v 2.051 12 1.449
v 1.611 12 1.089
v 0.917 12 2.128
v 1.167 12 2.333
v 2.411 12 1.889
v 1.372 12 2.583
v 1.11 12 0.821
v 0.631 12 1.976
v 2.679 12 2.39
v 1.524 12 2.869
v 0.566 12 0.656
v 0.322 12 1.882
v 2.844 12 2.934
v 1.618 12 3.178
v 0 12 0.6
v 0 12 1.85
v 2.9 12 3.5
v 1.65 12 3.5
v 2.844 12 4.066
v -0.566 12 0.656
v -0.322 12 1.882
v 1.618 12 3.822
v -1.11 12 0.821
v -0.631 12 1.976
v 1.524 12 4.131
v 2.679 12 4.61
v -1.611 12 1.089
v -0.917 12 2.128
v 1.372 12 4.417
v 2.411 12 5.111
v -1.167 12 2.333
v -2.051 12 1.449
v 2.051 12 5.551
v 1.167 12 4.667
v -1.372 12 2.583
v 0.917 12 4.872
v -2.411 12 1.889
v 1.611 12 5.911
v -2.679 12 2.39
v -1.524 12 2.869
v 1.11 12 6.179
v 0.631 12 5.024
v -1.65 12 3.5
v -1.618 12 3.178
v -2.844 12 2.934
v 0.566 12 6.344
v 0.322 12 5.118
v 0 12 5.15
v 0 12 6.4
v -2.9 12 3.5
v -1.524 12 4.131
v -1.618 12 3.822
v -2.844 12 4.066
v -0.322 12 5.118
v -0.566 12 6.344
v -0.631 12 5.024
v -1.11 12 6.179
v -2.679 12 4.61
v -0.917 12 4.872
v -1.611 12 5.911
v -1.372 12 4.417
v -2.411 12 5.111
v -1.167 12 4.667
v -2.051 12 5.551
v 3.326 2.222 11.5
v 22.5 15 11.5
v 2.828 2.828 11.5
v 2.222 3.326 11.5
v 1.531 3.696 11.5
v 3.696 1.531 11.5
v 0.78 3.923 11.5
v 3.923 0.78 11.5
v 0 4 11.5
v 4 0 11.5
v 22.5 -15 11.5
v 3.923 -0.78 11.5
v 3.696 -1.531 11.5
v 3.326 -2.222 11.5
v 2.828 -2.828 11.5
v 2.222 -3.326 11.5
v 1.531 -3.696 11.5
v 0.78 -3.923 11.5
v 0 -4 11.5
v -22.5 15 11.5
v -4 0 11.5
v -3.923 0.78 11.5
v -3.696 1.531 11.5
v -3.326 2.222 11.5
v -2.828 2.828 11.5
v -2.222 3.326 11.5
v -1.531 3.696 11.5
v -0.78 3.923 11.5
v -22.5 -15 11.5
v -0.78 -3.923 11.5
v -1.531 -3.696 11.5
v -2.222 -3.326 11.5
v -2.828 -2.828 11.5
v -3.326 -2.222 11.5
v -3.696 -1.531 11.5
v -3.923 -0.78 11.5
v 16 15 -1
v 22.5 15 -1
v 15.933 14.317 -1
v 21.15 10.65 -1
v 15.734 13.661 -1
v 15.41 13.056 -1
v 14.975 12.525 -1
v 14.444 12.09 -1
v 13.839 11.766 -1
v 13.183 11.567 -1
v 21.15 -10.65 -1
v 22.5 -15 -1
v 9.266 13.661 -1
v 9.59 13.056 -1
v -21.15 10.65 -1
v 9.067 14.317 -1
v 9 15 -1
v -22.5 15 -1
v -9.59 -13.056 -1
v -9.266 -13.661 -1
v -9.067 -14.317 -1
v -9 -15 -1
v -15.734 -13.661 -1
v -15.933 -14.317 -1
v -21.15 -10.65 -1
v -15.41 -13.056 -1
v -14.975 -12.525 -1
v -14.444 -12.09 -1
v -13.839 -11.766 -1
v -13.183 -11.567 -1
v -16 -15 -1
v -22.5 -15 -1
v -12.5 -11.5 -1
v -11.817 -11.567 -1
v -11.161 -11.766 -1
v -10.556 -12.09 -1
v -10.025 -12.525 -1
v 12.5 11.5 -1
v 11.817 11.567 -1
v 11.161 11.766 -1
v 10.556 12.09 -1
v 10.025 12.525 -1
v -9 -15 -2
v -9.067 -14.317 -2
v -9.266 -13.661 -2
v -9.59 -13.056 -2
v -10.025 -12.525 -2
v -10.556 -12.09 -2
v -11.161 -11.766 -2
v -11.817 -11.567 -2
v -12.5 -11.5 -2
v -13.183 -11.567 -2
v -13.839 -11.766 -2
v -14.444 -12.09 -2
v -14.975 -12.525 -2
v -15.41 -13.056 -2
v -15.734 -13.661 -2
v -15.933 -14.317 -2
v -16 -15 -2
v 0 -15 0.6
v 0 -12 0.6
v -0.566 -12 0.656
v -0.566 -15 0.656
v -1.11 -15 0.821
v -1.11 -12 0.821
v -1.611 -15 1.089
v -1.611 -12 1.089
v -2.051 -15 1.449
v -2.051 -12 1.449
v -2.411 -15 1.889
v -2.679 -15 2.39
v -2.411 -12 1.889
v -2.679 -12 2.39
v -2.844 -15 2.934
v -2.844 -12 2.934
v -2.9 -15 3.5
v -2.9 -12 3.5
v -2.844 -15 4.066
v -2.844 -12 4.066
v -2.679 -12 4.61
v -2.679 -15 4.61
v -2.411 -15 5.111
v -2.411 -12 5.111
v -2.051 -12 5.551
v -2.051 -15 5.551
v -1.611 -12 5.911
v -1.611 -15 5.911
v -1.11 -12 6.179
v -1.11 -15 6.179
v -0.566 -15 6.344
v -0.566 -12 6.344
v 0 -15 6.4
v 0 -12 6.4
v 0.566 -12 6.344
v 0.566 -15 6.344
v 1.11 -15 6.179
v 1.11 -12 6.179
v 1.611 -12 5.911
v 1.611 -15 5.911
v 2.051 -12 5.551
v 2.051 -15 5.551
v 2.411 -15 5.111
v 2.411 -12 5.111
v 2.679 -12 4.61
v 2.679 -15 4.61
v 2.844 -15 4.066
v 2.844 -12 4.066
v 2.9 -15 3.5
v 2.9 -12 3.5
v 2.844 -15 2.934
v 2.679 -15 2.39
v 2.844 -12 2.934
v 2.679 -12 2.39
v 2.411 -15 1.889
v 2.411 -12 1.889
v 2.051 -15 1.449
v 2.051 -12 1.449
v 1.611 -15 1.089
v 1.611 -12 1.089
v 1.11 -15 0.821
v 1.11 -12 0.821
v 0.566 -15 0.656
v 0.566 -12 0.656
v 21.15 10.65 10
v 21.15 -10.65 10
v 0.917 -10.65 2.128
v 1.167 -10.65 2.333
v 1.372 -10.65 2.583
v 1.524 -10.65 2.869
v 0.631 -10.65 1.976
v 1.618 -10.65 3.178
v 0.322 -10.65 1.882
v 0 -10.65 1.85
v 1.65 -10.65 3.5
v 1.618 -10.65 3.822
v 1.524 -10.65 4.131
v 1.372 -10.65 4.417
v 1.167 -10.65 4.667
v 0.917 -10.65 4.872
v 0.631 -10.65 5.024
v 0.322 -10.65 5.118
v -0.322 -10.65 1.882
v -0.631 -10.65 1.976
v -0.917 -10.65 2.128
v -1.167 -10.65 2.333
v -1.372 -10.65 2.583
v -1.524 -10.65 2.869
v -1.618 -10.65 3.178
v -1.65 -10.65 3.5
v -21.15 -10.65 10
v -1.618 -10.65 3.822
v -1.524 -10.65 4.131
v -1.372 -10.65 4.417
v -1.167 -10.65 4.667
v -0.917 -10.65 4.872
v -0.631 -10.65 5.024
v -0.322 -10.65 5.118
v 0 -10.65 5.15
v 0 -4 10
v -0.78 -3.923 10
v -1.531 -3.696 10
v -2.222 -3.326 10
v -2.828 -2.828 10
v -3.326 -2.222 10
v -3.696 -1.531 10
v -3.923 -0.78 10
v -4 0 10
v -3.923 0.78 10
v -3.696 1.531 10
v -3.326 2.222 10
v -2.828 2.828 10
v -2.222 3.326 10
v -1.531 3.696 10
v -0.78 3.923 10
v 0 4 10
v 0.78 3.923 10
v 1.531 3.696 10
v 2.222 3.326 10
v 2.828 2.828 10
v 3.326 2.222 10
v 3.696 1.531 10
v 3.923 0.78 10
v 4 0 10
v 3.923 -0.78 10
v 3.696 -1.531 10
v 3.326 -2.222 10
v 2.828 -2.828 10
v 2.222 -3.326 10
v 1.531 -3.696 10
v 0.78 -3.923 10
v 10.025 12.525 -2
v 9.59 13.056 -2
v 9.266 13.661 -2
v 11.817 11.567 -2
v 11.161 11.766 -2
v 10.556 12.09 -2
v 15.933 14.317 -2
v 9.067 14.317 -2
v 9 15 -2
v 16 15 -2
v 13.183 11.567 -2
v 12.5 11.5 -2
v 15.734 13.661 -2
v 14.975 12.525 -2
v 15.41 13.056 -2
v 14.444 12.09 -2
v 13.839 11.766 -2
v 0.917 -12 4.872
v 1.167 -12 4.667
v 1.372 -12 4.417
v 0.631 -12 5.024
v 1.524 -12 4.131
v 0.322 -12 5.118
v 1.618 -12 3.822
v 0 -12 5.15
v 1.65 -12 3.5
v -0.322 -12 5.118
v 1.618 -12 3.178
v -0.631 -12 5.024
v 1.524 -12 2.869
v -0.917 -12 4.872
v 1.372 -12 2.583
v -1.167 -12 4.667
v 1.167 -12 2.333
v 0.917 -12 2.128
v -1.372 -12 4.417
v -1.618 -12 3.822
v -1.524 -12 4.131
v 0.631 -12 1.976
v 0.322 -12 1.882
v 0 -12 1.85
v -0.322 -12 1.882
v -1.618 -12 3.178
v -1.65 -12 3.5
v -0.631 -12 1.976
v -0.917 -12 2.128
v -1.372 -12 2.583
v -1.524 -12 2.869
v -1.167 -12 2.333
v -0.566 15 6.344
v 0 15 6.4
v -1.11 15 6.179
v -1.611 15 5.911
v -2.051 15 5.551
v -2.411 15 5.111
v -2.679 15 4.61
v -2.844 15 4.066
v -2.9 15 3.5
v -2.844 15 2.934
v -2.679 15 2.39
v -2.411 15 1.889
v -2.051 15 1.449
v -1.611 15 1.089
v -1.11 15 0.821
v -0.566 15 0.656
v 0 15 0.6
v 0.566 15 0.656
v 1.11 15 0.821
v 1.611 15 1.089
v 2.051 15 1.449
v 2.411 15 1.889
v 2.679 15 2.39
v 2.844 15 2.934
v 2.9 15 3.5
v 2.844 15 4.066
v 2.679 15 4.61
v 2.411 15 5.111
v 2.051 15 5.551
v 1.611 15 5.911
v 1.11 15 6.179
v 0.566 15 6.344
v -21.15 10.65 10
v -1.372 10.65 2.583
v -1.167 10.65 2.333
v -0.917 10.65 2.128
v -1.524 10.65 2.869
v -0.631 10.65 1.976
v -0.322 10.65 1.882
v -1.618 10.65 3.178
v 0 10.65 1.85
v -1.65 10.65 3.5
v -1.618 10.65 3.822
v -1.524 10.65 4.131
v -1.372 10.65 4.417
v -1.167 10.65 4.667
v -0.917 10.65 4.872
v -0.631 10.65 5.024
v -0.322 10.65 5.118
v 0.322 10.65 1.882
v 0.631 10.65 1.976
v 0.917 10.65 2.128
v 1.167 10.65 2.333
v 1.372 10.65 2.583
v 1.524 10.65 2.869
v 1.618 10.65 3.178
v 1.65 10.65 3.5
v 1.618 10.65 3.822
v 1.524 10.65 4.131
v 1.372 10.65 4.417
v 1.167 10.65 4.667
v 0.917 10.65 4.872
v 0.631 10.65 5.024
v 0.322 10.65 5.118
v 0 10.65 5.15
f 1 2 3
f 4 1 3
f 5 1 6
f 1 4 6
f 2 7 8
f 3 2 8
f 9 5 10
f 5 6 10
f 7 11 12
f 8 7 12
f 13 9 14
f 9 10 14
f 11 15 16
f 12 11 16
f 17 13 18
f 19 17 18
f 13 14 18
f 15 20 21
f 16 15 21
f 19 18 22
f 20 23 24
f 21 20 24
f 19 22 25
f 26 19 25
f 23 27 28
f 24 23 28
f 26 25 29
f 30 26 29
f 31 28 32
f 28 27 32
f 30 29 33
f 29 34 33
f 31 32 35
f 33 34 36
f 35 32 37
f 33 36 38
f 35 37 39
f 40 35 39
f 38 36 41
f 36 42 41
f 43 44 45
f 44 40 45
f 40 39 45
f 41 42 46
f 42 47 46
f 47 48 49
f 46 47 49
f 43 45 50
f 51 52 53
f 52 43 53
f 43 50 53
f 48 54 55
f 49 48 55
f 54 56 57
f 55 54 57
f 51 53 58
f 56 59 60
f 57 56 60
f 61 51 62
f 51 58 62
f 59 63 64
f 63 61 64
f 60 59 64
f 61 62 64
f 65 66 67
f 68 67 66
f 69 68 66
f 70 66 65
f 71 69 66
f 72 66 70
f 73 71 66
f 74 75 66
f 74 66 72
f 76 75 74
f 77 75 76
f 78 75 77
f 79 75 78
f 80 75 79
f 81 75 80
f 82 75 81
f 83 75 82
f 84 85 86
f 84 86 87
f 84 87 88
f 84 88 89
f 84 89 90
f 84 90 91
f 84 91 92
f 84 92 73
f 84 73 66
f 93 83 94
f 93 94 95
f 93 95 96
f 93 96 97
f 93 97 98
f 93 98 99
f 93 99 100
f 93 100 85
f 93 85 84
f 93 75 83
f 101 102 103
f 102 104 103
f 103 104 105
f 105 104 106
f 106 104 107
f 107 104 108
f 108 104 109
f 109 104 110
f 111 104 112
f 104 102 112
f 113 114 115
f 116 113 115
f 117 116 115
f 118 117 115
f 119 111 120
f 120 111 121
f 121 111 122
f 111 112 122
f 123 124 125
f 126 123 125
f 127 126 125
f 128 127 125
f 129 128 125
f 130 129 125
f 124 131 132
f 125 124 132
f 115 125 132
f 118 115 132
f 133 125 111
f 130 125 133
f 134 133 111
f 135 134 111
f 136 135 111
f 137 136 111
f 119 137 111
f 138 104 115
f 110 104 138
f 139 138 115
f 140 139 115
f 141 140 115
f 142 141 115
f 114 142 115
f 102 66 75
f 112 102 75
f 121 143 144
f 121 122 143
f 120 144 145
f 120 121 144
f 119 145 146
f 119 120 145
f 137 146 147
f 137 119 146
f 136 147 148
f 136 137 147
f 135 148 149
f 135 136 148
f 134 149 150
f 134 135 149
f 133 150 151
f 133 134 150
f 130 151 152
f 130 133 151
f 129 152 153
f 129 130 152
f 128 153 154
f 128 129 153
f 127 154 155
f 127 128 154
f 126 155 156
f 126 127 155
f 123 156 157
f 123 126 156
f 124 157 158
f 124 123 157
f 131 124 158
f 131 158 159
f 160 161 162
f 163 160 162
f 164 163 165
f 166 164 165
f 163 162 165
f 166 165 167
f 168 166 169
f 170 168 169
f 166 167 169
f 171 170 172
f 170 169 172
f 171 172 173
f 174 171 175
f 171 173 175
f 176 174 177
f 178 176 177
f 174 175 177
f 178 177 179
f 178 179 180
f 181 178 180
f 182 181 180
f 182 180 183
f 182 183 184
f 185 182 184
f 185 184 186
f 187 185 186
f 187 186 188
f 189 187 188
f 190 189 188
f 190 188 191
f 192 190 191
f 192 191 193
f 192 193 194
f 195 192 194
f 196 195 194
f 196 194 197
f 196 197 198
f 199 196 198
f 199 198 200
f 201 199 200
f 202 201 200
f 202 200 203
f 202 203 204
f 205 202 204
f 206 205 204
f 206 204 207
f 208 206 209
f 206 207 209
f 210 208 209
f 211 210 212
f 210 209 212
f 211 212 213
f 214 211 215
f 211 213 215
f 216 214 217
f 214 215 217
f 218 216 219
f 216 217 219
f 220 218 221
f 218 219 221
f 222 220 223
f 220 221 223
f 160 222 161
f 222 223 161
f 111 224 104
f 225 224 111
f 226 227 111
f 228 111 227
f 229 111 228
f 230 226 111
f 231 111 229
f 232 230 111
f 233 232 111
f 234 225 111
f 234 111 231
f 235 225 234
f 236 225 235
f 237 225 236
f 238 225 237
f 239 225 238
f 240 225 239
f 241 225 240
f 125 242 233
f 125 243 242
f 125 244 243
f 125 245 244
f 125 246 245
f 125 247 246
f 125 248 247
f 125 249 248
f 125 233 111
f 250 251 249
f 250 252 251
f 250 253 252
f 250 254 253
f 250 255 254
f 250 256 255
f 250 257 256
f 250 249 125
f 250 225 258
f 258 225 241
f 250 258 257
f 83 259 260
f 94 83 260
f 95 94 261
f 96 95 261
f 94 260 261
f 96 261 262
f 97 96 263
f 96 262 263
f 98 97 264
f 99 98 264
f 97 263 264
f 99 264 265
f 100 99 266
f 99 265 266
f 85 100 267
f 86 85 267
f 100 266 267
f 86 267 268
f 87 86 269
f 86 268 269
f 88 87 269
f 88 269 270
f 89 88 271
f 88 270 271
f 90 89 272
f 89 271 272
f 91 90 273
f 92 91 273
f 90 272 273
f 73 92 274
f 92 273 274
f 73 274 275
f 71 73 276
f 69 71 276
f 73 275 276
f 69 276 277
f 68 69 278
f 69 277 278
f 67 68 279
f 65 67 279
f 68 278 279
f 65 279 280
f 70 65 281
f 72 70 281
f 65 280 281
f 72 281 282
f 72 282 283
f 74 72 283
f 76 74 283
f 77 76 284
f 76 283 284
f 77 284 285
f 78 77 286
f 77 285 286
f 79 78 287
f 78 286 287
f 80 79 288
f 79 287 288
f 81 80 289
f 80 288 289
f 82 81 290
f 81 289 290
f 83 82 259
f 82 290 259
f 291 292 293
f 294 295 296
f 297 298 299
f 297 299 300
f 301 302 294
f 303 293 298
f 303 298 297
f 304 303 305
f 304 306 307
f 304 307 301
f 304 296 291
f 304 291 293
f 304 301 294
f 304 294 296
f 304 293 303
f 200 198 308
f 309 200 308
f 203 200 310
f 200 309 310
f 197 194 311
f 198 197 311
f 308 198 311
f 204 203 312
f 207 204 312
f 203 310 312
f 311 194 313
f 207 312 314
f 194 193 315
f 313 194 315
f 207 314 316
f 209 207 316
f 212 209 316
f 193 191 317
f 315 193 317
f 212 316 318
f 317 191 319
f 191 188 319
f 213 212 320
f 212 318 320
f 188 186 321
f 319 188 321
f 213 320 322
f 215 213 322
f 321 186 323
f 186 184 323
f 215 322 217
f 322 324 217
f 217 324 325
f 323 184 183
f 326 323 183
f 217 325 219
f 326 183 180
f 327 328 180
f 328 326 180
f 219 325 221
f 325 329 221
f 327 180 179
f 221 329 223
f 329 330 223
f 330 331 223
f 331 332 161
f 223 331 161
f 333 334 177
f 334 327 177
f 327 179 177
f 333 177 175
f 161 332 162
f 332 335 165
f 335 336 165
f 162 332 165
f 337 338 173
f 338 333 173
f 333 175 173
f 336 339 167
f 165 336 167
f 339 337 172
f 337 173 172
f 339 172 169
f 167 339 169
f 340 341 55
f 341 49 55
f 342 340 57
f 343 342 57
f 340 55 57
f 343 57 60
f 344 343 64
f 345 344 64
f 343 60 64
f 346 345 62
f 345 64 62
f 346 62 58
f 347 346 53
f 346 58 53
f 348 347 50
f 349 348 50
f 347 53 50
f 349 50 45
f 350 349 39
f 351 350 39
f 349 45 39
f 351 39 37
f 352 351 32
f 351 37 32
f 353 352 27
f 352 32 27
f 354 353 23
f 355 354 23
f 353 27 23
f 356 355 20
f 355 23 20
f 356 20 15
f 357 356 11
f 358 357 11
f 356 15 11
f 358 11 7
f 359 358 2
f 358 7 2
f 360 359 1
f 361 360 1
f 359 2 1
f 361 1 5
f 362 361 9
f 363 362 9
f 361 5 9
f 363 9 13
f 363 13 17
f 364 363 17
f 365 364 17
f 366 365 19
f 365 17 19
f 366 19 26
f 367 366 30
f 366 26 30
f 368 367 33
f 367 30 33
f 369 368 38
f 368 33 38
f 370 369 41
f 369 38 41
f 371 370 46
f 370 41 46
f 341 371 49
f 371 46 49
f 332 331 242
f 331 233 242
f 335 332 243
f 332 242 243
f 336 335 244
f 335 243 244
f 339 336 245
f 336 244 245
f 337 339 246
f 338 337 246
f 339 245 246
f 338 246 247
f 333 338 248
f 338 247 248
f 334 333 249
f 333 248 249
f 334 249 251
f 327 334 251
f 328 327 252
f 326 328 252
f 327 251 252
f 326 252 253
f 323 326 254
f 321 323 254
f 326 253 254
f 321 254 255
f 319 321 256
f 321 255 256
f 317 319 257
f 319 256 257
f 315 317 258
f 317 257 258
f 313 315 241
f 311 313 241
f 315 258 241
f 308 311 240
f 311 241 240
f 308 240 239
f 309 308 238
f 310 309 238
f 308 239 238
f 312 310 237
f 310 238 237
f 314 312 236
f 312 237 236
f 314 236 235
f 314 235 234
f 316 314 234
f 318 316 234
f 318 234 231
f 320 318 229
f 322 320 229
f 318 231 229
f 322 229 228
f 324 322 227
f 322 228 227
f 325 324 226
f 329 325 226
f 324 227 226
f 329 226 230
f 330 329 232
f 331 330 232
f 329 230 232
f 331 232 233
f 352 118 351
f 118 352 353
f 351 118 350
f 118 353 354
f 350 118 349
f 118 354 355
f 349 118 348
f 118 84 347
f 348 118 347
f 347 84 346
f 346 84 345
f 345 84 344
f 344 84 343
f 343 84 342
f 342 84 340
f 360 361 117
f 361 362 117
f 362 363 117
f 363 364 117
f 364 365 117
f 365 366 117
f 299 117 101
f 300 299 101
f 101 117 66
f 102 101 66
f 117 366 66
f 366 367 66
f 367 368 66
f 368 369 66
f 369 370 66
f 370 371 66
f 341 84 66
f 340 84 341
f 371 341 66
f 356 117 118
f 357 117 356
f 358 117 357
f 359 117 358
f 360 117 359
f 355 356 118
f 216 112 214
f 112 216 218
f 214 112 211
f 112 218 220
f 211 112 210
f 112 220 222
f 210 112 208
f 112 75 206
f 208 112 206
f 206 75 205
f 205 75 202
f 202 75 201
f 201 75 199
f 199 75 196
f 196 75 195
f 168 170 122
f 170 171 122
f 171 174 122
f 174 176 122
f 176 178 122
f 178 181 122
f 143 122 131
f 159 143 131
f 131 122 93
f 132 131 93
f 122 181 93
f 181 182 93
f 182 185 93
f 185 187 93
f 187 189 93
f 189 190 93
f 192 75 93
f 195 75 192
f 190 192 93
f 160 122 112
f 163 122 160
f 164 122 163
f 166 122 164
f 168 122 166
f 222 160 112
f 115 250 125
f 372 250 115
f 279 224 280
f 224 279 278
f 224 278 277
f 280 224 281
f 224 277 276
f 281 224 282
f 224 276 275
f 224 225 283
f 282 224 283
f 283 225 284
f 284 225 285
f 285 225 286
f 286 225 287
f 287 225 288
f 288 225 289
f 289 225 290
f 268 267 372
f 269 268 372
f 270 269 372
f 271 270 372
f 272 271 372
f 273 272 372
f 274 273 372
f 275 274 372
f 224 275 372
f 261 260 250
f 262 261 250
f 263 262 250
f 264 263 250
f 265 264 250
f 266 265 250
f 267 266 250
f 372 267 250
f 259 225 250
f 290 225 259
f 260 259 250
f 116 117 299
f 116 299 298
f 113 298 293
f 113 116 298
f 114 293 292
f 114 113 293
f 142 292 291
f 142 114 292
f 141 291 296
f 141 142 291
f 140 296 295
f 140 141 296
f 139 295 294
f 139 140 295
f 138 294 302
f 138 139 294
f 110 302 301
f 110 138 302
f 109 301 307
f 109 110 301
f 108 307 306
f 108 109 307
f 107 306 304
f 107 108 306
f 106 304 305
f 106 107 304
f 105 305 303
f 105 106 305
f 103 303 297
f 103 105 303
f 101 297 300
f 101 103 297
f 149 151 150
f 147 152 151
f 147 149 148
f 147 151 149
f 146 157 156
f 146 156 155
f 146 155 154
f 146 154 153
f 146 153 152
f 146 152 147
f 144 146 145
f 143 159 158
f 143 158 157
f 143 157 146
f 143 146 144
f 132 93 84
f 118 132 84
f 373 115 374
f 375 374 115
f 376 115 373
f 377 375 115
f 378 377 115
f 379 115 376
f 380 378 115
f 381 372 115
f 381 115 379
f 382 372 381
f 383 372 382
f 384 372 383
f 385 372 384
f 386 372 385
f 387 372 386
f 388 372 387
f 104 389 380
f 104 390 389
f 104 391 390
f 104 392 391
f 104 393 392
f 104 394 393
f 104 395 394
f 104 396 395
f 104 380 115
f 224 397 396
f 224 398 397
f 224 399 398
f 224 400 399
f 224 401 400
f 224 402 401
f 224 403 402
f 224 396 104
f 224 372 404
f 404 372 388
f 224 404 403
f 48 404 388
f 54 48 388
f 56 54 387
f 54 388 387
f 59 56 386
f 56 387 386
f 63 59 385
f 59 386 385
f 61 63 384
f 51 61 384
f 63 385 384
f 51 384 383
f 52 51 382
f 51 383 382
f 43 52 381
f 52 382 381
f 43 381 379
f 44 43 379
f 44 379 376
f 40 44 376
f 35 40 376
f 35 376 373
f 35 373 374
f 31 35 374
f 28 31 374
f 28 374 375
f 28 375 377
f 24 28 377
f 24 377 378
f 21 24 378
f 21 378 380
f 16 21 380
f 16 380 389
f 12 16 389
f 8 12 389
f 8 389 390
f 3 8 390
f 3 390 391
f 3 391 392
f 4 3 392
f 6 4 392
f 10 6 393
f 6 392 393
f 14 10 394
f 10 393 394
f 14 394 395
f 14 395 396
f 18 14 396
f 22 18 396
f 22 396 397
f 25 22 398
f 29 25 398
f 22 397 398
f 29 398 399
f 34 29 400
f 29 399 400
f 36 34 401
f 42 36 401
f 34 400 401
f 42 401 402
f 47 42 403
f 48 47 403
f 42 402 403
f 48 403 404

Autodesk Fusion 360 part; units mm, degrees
sketch "Esquisse7" plane through (0, 0, 10) normal (0, 0, 1) x (-1, 0, 0)
  circle A0 centre (-12, 0) radius 7.6
  circle A1 centre (12, 0) radius 7.6
  line L0 (-19.9, -8.9) -> (19.9, -8.9)
  line L1 (19.9, -8.9) -> (19.9, 8.9)
  line L2 (19.9, 8.9) -> (-19.9, 8.9)
  line L3 (-19.9, 8.9) -> (-19.9, -8.9)
  line L4 (0, 0) -> (-2.53, 5.0152)
sketch "Esquisse3" plane through (0, 0, 10) normal (0, 0, 1) x (-1, 0, 0)
  line L0 (21.15, -10.65) -> (-21.15, -10.65)
  line L1 (-21.15, -10.65) -> (-21.15, 10.65)
  line L2 (-21.15, 10.65) -> (21.15, 10.65)
  line L3 (21.15, 10.65) -> (21.15, -10.65)
  line L4 (21.15, -10.65) -> (-21.15, 10.65) construction
  line L5 (-21.15, -10.65) -> (21.15, 10.65) construction
  line L6 (22.5, -15) -> (-22.5, -15)
  line L7 (-22.5, -15) -> (-22.5, 15)
  line L8 (-22.5, 15) -> (22.5, 15)
  line L9 (22.5, 15) -> (22.5, -15)
  line L10 (22.5, -15) -> (-22.5, 15) construction
  line L11 (-22.5, -15) -> (22.5, 15) construction
  dimension "d76" = 42.3
  dimension "d77" = 21.3
  dimension "d78" = 45
  dimension "d79" = 30
extrude "Extrusion1" add sketch "Esquisse3" against normal blind 11
extrude "Extrusion2" add sketch "Esquisse3" along normal blind 1.5 contours L0 L1 L2 L3 | L6 L7 L8 L9
sketch "Esquisse4" plane through (0, -15, 0) normal (0, -1, 0) x (1, 0, 0)
  line L0 (-22.5, 11.5) -> (-22.5, -1)
  line L1 (-22.5, -1) -> (22.5, -1)
  line L2 (22.5, -1) -> (22.5, 11.5)
  line L3 (22.5, 11.5) -> (-22.5, 11.5)
  line L4 (0, 0) -> (0, 3.5)
  dimension "d84" = 3.5
hole "Perçage1" at (0, -15, 3.5) direction (0, 1, 0) diameter 3.3 depth 8 tip angle 180 counterbore diameter 5.8 counterbore depth 3
sketch "Esquisse5" plane through (0, 15, 0) normal (0, 1, 0) x (-1, 0, 0)
  line L0 (-22.5, 11.5) -> (-22.5, -1)
  line L1 (-22.5, -1) -> (22.5, -1)
  line L2 (22.5, -1) -> (22.5, 11.5)
  line L3 (22.5, 11.5) -> (-22.5, 11.5)
  line L4 (0, 0) -> (0, 3.5)
  dimension "d100" = 3.5
hole "Perçage2" at (0, 15, 3.5) direction (0, -1, 0) diameter 3.3 depth 8 tip angle 180 counterbore diameter 5.8 counterbore depth 3
hole "Perçage3" at (0, 0, 11.5) direction (0, 0, -1) diameter 8 depth 1.5 tip angle 180
sketch "Esquisse6" plane through (0, 0, -1) normal (0, 0, -1) x (1, 0, 0)
  line L0 (-21.15, 10.65) -> (21.15, 10.65)
  line L1 (21.15, 10.65) -> (21.15, -10.65)
  line L2 (21.15, -10.65) -> (-21.15, -10.65)
  line L3 (-21.15, -10.65) -> (-21.15, 10.65)
  line L4 (22.5, 15) -> (-22.5, 15)
  line L5 (-22.5, 15) -> (-22.5, -15)
  line L6 (-22.5, -15) -> (22.5, -15)
  line L7 (22.5, -15) -> (22.5, 15)
  line L8 (-22.5, 15) -> (-12.5, 15)
  circle A0 centre (-12.5, 15) radius 3.5
  line L9 (22.5, -15) -> (12.5, -15)
  circle A1 centre (12.5, -15) radius 3.5
  dimension "d119" = 7
  dimension "d120" = 10
  dimension "d121" = 7
extrude "Extrusion3" add sketch "Esquisse6" along normal blind 1 contours L4 L8 A0 | L6 L9 A1 picked at (-14.8203, 14.8261) picked at (10.334, -14.1499)
